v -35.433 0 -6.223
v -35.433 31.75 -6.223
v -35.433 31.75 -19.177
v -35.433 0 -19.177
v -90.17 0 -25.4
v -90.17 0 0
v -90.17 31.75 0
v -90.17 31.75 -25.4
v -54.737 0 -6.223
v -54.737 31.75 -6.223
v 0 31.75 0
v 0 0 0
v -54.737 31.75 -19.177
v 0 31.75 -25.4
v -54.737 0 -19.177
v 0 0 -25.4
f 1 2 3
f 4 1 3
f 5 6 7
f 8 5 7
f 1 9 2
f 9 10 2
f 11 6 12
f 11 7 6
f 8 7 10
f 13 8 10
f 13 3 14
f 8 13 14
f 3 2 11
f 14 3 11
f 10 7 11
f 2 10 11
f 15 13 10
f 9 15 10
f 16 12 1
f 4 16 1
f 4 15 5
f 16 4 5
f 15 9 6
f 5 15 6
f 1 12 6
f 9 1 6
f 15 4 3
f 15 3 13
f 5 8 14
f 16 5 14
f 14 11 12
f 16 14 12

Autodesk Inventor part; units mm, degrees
ref_plane "YZ Plane" through (0, 0, 0) normal (1, 0, 0) x (0, 1, 0)
ref_plane "XZ Plane" through (0, 0, 0) normal (0, 1, 0) x (-1, 0, 0)
ref_plane "XY Plane" through (0, 0, 0) normal (0, 0, 1) x (1, 0, 0)
sketch "Sketch1" plane through (0, 0, 0) normal (0, 0, 1) x (1, 0, 0)
  line L0 (0, 0) -> (-90.17, 0)
  line L1 (-90.17, 0) -> (-90.17, 31.75)
  line L2 (-90.17, 31.75) -> (0, 31.75)
  line L3 (0, 31.75) -> (0, 0)
  dimension "d0" = 90.17
  dimension "d1" = 31.75
extrude "Extrusion1" add sketch "Sketch1" against normal blind 25.4
sketch "Sketch2" plane through (-90.17, 31.75, 0) normal (0, 1, 0) x (1, 0, 0)
  line L0 (0, 0) -> (90.17, 0) projected
  line L1 (90.17, 0) -> (90.17, 25.4) projected
  line L2 (0, 25.4) -> (90.17, 25.4) projected
  line L3 (0, 0) -> (0, 25.4) projected
  line L4 (90.17, 0) -> (52.07, 0)
  line L5 (52.07, 0) -> (52.07, 25.4)
  line L6 (52.07, 25.4) -> (90.17, 25.4)
  line L7 (90.17, 25.4) -> (90.17, 0)
  line L8 (0, 0) -> (0, 25.4) projected
  line L9 (0, 0) -> (38.1, 0)
  line L10 (38.1, 0) -> (38.1, 25.4)
  line L11 (38.1, 25.4) -> (0, 25.4)
  line L12 (0, 25.4) -> (0, 0)
  line L13 (38.1, 6.223) -> (52.07, 6.223)
  line L14 (52.07, 6.223) -> (52.07, 19.177)
  line L15 (52.07, 19.177) -> (38.1, 19.177)
  line L16 (38.1, 19.177) -> (38.1, 6.223)
  circle A0 centre (45.085, 12.7) radius 6.477
  line L17 (35.433, 6.223) -> (54.737, 6.223)
  line L18 (54.737, 6.223) -> (54.737, 19.177)
  line L19 (54.737, 19.177) -> (35.433, 19.177)
  line L20 (35.433, 19.177) -> (35.433, 6.223)
  dimension "d4" = 38.1
  dimension "d5" = 38.1
  dimension "d6" = 6.223
  dimension "d7" = 6.223
  dimension "d8" = 6.477
  dimension "d10" = 6.985
  dimension "d11" = 6.985
  dimension "d12" = 12.954
  dimension "d15" = 3.175
  dimension "d16" = 3.175
extrude "Extrusion2" cut sketch "Sketch2" against normal blind 76.2 contours A0
sketch "Sketch3" plane through (-90.17, 31.75, 0) normal (0, 1, 0) x (1, 0, 0)
  circle A0 centre (45.085, 12.7) radius 6.477 projected
  line L0 (35.433, 6.223) -> (54.737, 6.223)
  line L1 (54.737, 6.223) -> (54.737, 19.177)
  line L2 (54.737, 19.177) -> (35.433, 19.177)
  line L3 (35.433, 19.177) -> (35.433, 6.223)
  dimension "d17" = 0
  dimension "d18" = 0
  dimension "d19" = 3.175
  dimension "d20" = 3.175
extrude "Extrusion3" cut sketch "Sketch3" against normal blind 76.2 contours A0 L2 L1 L0 | A0 L0 L3 L2
properties part number "Lidar Holder 1"
